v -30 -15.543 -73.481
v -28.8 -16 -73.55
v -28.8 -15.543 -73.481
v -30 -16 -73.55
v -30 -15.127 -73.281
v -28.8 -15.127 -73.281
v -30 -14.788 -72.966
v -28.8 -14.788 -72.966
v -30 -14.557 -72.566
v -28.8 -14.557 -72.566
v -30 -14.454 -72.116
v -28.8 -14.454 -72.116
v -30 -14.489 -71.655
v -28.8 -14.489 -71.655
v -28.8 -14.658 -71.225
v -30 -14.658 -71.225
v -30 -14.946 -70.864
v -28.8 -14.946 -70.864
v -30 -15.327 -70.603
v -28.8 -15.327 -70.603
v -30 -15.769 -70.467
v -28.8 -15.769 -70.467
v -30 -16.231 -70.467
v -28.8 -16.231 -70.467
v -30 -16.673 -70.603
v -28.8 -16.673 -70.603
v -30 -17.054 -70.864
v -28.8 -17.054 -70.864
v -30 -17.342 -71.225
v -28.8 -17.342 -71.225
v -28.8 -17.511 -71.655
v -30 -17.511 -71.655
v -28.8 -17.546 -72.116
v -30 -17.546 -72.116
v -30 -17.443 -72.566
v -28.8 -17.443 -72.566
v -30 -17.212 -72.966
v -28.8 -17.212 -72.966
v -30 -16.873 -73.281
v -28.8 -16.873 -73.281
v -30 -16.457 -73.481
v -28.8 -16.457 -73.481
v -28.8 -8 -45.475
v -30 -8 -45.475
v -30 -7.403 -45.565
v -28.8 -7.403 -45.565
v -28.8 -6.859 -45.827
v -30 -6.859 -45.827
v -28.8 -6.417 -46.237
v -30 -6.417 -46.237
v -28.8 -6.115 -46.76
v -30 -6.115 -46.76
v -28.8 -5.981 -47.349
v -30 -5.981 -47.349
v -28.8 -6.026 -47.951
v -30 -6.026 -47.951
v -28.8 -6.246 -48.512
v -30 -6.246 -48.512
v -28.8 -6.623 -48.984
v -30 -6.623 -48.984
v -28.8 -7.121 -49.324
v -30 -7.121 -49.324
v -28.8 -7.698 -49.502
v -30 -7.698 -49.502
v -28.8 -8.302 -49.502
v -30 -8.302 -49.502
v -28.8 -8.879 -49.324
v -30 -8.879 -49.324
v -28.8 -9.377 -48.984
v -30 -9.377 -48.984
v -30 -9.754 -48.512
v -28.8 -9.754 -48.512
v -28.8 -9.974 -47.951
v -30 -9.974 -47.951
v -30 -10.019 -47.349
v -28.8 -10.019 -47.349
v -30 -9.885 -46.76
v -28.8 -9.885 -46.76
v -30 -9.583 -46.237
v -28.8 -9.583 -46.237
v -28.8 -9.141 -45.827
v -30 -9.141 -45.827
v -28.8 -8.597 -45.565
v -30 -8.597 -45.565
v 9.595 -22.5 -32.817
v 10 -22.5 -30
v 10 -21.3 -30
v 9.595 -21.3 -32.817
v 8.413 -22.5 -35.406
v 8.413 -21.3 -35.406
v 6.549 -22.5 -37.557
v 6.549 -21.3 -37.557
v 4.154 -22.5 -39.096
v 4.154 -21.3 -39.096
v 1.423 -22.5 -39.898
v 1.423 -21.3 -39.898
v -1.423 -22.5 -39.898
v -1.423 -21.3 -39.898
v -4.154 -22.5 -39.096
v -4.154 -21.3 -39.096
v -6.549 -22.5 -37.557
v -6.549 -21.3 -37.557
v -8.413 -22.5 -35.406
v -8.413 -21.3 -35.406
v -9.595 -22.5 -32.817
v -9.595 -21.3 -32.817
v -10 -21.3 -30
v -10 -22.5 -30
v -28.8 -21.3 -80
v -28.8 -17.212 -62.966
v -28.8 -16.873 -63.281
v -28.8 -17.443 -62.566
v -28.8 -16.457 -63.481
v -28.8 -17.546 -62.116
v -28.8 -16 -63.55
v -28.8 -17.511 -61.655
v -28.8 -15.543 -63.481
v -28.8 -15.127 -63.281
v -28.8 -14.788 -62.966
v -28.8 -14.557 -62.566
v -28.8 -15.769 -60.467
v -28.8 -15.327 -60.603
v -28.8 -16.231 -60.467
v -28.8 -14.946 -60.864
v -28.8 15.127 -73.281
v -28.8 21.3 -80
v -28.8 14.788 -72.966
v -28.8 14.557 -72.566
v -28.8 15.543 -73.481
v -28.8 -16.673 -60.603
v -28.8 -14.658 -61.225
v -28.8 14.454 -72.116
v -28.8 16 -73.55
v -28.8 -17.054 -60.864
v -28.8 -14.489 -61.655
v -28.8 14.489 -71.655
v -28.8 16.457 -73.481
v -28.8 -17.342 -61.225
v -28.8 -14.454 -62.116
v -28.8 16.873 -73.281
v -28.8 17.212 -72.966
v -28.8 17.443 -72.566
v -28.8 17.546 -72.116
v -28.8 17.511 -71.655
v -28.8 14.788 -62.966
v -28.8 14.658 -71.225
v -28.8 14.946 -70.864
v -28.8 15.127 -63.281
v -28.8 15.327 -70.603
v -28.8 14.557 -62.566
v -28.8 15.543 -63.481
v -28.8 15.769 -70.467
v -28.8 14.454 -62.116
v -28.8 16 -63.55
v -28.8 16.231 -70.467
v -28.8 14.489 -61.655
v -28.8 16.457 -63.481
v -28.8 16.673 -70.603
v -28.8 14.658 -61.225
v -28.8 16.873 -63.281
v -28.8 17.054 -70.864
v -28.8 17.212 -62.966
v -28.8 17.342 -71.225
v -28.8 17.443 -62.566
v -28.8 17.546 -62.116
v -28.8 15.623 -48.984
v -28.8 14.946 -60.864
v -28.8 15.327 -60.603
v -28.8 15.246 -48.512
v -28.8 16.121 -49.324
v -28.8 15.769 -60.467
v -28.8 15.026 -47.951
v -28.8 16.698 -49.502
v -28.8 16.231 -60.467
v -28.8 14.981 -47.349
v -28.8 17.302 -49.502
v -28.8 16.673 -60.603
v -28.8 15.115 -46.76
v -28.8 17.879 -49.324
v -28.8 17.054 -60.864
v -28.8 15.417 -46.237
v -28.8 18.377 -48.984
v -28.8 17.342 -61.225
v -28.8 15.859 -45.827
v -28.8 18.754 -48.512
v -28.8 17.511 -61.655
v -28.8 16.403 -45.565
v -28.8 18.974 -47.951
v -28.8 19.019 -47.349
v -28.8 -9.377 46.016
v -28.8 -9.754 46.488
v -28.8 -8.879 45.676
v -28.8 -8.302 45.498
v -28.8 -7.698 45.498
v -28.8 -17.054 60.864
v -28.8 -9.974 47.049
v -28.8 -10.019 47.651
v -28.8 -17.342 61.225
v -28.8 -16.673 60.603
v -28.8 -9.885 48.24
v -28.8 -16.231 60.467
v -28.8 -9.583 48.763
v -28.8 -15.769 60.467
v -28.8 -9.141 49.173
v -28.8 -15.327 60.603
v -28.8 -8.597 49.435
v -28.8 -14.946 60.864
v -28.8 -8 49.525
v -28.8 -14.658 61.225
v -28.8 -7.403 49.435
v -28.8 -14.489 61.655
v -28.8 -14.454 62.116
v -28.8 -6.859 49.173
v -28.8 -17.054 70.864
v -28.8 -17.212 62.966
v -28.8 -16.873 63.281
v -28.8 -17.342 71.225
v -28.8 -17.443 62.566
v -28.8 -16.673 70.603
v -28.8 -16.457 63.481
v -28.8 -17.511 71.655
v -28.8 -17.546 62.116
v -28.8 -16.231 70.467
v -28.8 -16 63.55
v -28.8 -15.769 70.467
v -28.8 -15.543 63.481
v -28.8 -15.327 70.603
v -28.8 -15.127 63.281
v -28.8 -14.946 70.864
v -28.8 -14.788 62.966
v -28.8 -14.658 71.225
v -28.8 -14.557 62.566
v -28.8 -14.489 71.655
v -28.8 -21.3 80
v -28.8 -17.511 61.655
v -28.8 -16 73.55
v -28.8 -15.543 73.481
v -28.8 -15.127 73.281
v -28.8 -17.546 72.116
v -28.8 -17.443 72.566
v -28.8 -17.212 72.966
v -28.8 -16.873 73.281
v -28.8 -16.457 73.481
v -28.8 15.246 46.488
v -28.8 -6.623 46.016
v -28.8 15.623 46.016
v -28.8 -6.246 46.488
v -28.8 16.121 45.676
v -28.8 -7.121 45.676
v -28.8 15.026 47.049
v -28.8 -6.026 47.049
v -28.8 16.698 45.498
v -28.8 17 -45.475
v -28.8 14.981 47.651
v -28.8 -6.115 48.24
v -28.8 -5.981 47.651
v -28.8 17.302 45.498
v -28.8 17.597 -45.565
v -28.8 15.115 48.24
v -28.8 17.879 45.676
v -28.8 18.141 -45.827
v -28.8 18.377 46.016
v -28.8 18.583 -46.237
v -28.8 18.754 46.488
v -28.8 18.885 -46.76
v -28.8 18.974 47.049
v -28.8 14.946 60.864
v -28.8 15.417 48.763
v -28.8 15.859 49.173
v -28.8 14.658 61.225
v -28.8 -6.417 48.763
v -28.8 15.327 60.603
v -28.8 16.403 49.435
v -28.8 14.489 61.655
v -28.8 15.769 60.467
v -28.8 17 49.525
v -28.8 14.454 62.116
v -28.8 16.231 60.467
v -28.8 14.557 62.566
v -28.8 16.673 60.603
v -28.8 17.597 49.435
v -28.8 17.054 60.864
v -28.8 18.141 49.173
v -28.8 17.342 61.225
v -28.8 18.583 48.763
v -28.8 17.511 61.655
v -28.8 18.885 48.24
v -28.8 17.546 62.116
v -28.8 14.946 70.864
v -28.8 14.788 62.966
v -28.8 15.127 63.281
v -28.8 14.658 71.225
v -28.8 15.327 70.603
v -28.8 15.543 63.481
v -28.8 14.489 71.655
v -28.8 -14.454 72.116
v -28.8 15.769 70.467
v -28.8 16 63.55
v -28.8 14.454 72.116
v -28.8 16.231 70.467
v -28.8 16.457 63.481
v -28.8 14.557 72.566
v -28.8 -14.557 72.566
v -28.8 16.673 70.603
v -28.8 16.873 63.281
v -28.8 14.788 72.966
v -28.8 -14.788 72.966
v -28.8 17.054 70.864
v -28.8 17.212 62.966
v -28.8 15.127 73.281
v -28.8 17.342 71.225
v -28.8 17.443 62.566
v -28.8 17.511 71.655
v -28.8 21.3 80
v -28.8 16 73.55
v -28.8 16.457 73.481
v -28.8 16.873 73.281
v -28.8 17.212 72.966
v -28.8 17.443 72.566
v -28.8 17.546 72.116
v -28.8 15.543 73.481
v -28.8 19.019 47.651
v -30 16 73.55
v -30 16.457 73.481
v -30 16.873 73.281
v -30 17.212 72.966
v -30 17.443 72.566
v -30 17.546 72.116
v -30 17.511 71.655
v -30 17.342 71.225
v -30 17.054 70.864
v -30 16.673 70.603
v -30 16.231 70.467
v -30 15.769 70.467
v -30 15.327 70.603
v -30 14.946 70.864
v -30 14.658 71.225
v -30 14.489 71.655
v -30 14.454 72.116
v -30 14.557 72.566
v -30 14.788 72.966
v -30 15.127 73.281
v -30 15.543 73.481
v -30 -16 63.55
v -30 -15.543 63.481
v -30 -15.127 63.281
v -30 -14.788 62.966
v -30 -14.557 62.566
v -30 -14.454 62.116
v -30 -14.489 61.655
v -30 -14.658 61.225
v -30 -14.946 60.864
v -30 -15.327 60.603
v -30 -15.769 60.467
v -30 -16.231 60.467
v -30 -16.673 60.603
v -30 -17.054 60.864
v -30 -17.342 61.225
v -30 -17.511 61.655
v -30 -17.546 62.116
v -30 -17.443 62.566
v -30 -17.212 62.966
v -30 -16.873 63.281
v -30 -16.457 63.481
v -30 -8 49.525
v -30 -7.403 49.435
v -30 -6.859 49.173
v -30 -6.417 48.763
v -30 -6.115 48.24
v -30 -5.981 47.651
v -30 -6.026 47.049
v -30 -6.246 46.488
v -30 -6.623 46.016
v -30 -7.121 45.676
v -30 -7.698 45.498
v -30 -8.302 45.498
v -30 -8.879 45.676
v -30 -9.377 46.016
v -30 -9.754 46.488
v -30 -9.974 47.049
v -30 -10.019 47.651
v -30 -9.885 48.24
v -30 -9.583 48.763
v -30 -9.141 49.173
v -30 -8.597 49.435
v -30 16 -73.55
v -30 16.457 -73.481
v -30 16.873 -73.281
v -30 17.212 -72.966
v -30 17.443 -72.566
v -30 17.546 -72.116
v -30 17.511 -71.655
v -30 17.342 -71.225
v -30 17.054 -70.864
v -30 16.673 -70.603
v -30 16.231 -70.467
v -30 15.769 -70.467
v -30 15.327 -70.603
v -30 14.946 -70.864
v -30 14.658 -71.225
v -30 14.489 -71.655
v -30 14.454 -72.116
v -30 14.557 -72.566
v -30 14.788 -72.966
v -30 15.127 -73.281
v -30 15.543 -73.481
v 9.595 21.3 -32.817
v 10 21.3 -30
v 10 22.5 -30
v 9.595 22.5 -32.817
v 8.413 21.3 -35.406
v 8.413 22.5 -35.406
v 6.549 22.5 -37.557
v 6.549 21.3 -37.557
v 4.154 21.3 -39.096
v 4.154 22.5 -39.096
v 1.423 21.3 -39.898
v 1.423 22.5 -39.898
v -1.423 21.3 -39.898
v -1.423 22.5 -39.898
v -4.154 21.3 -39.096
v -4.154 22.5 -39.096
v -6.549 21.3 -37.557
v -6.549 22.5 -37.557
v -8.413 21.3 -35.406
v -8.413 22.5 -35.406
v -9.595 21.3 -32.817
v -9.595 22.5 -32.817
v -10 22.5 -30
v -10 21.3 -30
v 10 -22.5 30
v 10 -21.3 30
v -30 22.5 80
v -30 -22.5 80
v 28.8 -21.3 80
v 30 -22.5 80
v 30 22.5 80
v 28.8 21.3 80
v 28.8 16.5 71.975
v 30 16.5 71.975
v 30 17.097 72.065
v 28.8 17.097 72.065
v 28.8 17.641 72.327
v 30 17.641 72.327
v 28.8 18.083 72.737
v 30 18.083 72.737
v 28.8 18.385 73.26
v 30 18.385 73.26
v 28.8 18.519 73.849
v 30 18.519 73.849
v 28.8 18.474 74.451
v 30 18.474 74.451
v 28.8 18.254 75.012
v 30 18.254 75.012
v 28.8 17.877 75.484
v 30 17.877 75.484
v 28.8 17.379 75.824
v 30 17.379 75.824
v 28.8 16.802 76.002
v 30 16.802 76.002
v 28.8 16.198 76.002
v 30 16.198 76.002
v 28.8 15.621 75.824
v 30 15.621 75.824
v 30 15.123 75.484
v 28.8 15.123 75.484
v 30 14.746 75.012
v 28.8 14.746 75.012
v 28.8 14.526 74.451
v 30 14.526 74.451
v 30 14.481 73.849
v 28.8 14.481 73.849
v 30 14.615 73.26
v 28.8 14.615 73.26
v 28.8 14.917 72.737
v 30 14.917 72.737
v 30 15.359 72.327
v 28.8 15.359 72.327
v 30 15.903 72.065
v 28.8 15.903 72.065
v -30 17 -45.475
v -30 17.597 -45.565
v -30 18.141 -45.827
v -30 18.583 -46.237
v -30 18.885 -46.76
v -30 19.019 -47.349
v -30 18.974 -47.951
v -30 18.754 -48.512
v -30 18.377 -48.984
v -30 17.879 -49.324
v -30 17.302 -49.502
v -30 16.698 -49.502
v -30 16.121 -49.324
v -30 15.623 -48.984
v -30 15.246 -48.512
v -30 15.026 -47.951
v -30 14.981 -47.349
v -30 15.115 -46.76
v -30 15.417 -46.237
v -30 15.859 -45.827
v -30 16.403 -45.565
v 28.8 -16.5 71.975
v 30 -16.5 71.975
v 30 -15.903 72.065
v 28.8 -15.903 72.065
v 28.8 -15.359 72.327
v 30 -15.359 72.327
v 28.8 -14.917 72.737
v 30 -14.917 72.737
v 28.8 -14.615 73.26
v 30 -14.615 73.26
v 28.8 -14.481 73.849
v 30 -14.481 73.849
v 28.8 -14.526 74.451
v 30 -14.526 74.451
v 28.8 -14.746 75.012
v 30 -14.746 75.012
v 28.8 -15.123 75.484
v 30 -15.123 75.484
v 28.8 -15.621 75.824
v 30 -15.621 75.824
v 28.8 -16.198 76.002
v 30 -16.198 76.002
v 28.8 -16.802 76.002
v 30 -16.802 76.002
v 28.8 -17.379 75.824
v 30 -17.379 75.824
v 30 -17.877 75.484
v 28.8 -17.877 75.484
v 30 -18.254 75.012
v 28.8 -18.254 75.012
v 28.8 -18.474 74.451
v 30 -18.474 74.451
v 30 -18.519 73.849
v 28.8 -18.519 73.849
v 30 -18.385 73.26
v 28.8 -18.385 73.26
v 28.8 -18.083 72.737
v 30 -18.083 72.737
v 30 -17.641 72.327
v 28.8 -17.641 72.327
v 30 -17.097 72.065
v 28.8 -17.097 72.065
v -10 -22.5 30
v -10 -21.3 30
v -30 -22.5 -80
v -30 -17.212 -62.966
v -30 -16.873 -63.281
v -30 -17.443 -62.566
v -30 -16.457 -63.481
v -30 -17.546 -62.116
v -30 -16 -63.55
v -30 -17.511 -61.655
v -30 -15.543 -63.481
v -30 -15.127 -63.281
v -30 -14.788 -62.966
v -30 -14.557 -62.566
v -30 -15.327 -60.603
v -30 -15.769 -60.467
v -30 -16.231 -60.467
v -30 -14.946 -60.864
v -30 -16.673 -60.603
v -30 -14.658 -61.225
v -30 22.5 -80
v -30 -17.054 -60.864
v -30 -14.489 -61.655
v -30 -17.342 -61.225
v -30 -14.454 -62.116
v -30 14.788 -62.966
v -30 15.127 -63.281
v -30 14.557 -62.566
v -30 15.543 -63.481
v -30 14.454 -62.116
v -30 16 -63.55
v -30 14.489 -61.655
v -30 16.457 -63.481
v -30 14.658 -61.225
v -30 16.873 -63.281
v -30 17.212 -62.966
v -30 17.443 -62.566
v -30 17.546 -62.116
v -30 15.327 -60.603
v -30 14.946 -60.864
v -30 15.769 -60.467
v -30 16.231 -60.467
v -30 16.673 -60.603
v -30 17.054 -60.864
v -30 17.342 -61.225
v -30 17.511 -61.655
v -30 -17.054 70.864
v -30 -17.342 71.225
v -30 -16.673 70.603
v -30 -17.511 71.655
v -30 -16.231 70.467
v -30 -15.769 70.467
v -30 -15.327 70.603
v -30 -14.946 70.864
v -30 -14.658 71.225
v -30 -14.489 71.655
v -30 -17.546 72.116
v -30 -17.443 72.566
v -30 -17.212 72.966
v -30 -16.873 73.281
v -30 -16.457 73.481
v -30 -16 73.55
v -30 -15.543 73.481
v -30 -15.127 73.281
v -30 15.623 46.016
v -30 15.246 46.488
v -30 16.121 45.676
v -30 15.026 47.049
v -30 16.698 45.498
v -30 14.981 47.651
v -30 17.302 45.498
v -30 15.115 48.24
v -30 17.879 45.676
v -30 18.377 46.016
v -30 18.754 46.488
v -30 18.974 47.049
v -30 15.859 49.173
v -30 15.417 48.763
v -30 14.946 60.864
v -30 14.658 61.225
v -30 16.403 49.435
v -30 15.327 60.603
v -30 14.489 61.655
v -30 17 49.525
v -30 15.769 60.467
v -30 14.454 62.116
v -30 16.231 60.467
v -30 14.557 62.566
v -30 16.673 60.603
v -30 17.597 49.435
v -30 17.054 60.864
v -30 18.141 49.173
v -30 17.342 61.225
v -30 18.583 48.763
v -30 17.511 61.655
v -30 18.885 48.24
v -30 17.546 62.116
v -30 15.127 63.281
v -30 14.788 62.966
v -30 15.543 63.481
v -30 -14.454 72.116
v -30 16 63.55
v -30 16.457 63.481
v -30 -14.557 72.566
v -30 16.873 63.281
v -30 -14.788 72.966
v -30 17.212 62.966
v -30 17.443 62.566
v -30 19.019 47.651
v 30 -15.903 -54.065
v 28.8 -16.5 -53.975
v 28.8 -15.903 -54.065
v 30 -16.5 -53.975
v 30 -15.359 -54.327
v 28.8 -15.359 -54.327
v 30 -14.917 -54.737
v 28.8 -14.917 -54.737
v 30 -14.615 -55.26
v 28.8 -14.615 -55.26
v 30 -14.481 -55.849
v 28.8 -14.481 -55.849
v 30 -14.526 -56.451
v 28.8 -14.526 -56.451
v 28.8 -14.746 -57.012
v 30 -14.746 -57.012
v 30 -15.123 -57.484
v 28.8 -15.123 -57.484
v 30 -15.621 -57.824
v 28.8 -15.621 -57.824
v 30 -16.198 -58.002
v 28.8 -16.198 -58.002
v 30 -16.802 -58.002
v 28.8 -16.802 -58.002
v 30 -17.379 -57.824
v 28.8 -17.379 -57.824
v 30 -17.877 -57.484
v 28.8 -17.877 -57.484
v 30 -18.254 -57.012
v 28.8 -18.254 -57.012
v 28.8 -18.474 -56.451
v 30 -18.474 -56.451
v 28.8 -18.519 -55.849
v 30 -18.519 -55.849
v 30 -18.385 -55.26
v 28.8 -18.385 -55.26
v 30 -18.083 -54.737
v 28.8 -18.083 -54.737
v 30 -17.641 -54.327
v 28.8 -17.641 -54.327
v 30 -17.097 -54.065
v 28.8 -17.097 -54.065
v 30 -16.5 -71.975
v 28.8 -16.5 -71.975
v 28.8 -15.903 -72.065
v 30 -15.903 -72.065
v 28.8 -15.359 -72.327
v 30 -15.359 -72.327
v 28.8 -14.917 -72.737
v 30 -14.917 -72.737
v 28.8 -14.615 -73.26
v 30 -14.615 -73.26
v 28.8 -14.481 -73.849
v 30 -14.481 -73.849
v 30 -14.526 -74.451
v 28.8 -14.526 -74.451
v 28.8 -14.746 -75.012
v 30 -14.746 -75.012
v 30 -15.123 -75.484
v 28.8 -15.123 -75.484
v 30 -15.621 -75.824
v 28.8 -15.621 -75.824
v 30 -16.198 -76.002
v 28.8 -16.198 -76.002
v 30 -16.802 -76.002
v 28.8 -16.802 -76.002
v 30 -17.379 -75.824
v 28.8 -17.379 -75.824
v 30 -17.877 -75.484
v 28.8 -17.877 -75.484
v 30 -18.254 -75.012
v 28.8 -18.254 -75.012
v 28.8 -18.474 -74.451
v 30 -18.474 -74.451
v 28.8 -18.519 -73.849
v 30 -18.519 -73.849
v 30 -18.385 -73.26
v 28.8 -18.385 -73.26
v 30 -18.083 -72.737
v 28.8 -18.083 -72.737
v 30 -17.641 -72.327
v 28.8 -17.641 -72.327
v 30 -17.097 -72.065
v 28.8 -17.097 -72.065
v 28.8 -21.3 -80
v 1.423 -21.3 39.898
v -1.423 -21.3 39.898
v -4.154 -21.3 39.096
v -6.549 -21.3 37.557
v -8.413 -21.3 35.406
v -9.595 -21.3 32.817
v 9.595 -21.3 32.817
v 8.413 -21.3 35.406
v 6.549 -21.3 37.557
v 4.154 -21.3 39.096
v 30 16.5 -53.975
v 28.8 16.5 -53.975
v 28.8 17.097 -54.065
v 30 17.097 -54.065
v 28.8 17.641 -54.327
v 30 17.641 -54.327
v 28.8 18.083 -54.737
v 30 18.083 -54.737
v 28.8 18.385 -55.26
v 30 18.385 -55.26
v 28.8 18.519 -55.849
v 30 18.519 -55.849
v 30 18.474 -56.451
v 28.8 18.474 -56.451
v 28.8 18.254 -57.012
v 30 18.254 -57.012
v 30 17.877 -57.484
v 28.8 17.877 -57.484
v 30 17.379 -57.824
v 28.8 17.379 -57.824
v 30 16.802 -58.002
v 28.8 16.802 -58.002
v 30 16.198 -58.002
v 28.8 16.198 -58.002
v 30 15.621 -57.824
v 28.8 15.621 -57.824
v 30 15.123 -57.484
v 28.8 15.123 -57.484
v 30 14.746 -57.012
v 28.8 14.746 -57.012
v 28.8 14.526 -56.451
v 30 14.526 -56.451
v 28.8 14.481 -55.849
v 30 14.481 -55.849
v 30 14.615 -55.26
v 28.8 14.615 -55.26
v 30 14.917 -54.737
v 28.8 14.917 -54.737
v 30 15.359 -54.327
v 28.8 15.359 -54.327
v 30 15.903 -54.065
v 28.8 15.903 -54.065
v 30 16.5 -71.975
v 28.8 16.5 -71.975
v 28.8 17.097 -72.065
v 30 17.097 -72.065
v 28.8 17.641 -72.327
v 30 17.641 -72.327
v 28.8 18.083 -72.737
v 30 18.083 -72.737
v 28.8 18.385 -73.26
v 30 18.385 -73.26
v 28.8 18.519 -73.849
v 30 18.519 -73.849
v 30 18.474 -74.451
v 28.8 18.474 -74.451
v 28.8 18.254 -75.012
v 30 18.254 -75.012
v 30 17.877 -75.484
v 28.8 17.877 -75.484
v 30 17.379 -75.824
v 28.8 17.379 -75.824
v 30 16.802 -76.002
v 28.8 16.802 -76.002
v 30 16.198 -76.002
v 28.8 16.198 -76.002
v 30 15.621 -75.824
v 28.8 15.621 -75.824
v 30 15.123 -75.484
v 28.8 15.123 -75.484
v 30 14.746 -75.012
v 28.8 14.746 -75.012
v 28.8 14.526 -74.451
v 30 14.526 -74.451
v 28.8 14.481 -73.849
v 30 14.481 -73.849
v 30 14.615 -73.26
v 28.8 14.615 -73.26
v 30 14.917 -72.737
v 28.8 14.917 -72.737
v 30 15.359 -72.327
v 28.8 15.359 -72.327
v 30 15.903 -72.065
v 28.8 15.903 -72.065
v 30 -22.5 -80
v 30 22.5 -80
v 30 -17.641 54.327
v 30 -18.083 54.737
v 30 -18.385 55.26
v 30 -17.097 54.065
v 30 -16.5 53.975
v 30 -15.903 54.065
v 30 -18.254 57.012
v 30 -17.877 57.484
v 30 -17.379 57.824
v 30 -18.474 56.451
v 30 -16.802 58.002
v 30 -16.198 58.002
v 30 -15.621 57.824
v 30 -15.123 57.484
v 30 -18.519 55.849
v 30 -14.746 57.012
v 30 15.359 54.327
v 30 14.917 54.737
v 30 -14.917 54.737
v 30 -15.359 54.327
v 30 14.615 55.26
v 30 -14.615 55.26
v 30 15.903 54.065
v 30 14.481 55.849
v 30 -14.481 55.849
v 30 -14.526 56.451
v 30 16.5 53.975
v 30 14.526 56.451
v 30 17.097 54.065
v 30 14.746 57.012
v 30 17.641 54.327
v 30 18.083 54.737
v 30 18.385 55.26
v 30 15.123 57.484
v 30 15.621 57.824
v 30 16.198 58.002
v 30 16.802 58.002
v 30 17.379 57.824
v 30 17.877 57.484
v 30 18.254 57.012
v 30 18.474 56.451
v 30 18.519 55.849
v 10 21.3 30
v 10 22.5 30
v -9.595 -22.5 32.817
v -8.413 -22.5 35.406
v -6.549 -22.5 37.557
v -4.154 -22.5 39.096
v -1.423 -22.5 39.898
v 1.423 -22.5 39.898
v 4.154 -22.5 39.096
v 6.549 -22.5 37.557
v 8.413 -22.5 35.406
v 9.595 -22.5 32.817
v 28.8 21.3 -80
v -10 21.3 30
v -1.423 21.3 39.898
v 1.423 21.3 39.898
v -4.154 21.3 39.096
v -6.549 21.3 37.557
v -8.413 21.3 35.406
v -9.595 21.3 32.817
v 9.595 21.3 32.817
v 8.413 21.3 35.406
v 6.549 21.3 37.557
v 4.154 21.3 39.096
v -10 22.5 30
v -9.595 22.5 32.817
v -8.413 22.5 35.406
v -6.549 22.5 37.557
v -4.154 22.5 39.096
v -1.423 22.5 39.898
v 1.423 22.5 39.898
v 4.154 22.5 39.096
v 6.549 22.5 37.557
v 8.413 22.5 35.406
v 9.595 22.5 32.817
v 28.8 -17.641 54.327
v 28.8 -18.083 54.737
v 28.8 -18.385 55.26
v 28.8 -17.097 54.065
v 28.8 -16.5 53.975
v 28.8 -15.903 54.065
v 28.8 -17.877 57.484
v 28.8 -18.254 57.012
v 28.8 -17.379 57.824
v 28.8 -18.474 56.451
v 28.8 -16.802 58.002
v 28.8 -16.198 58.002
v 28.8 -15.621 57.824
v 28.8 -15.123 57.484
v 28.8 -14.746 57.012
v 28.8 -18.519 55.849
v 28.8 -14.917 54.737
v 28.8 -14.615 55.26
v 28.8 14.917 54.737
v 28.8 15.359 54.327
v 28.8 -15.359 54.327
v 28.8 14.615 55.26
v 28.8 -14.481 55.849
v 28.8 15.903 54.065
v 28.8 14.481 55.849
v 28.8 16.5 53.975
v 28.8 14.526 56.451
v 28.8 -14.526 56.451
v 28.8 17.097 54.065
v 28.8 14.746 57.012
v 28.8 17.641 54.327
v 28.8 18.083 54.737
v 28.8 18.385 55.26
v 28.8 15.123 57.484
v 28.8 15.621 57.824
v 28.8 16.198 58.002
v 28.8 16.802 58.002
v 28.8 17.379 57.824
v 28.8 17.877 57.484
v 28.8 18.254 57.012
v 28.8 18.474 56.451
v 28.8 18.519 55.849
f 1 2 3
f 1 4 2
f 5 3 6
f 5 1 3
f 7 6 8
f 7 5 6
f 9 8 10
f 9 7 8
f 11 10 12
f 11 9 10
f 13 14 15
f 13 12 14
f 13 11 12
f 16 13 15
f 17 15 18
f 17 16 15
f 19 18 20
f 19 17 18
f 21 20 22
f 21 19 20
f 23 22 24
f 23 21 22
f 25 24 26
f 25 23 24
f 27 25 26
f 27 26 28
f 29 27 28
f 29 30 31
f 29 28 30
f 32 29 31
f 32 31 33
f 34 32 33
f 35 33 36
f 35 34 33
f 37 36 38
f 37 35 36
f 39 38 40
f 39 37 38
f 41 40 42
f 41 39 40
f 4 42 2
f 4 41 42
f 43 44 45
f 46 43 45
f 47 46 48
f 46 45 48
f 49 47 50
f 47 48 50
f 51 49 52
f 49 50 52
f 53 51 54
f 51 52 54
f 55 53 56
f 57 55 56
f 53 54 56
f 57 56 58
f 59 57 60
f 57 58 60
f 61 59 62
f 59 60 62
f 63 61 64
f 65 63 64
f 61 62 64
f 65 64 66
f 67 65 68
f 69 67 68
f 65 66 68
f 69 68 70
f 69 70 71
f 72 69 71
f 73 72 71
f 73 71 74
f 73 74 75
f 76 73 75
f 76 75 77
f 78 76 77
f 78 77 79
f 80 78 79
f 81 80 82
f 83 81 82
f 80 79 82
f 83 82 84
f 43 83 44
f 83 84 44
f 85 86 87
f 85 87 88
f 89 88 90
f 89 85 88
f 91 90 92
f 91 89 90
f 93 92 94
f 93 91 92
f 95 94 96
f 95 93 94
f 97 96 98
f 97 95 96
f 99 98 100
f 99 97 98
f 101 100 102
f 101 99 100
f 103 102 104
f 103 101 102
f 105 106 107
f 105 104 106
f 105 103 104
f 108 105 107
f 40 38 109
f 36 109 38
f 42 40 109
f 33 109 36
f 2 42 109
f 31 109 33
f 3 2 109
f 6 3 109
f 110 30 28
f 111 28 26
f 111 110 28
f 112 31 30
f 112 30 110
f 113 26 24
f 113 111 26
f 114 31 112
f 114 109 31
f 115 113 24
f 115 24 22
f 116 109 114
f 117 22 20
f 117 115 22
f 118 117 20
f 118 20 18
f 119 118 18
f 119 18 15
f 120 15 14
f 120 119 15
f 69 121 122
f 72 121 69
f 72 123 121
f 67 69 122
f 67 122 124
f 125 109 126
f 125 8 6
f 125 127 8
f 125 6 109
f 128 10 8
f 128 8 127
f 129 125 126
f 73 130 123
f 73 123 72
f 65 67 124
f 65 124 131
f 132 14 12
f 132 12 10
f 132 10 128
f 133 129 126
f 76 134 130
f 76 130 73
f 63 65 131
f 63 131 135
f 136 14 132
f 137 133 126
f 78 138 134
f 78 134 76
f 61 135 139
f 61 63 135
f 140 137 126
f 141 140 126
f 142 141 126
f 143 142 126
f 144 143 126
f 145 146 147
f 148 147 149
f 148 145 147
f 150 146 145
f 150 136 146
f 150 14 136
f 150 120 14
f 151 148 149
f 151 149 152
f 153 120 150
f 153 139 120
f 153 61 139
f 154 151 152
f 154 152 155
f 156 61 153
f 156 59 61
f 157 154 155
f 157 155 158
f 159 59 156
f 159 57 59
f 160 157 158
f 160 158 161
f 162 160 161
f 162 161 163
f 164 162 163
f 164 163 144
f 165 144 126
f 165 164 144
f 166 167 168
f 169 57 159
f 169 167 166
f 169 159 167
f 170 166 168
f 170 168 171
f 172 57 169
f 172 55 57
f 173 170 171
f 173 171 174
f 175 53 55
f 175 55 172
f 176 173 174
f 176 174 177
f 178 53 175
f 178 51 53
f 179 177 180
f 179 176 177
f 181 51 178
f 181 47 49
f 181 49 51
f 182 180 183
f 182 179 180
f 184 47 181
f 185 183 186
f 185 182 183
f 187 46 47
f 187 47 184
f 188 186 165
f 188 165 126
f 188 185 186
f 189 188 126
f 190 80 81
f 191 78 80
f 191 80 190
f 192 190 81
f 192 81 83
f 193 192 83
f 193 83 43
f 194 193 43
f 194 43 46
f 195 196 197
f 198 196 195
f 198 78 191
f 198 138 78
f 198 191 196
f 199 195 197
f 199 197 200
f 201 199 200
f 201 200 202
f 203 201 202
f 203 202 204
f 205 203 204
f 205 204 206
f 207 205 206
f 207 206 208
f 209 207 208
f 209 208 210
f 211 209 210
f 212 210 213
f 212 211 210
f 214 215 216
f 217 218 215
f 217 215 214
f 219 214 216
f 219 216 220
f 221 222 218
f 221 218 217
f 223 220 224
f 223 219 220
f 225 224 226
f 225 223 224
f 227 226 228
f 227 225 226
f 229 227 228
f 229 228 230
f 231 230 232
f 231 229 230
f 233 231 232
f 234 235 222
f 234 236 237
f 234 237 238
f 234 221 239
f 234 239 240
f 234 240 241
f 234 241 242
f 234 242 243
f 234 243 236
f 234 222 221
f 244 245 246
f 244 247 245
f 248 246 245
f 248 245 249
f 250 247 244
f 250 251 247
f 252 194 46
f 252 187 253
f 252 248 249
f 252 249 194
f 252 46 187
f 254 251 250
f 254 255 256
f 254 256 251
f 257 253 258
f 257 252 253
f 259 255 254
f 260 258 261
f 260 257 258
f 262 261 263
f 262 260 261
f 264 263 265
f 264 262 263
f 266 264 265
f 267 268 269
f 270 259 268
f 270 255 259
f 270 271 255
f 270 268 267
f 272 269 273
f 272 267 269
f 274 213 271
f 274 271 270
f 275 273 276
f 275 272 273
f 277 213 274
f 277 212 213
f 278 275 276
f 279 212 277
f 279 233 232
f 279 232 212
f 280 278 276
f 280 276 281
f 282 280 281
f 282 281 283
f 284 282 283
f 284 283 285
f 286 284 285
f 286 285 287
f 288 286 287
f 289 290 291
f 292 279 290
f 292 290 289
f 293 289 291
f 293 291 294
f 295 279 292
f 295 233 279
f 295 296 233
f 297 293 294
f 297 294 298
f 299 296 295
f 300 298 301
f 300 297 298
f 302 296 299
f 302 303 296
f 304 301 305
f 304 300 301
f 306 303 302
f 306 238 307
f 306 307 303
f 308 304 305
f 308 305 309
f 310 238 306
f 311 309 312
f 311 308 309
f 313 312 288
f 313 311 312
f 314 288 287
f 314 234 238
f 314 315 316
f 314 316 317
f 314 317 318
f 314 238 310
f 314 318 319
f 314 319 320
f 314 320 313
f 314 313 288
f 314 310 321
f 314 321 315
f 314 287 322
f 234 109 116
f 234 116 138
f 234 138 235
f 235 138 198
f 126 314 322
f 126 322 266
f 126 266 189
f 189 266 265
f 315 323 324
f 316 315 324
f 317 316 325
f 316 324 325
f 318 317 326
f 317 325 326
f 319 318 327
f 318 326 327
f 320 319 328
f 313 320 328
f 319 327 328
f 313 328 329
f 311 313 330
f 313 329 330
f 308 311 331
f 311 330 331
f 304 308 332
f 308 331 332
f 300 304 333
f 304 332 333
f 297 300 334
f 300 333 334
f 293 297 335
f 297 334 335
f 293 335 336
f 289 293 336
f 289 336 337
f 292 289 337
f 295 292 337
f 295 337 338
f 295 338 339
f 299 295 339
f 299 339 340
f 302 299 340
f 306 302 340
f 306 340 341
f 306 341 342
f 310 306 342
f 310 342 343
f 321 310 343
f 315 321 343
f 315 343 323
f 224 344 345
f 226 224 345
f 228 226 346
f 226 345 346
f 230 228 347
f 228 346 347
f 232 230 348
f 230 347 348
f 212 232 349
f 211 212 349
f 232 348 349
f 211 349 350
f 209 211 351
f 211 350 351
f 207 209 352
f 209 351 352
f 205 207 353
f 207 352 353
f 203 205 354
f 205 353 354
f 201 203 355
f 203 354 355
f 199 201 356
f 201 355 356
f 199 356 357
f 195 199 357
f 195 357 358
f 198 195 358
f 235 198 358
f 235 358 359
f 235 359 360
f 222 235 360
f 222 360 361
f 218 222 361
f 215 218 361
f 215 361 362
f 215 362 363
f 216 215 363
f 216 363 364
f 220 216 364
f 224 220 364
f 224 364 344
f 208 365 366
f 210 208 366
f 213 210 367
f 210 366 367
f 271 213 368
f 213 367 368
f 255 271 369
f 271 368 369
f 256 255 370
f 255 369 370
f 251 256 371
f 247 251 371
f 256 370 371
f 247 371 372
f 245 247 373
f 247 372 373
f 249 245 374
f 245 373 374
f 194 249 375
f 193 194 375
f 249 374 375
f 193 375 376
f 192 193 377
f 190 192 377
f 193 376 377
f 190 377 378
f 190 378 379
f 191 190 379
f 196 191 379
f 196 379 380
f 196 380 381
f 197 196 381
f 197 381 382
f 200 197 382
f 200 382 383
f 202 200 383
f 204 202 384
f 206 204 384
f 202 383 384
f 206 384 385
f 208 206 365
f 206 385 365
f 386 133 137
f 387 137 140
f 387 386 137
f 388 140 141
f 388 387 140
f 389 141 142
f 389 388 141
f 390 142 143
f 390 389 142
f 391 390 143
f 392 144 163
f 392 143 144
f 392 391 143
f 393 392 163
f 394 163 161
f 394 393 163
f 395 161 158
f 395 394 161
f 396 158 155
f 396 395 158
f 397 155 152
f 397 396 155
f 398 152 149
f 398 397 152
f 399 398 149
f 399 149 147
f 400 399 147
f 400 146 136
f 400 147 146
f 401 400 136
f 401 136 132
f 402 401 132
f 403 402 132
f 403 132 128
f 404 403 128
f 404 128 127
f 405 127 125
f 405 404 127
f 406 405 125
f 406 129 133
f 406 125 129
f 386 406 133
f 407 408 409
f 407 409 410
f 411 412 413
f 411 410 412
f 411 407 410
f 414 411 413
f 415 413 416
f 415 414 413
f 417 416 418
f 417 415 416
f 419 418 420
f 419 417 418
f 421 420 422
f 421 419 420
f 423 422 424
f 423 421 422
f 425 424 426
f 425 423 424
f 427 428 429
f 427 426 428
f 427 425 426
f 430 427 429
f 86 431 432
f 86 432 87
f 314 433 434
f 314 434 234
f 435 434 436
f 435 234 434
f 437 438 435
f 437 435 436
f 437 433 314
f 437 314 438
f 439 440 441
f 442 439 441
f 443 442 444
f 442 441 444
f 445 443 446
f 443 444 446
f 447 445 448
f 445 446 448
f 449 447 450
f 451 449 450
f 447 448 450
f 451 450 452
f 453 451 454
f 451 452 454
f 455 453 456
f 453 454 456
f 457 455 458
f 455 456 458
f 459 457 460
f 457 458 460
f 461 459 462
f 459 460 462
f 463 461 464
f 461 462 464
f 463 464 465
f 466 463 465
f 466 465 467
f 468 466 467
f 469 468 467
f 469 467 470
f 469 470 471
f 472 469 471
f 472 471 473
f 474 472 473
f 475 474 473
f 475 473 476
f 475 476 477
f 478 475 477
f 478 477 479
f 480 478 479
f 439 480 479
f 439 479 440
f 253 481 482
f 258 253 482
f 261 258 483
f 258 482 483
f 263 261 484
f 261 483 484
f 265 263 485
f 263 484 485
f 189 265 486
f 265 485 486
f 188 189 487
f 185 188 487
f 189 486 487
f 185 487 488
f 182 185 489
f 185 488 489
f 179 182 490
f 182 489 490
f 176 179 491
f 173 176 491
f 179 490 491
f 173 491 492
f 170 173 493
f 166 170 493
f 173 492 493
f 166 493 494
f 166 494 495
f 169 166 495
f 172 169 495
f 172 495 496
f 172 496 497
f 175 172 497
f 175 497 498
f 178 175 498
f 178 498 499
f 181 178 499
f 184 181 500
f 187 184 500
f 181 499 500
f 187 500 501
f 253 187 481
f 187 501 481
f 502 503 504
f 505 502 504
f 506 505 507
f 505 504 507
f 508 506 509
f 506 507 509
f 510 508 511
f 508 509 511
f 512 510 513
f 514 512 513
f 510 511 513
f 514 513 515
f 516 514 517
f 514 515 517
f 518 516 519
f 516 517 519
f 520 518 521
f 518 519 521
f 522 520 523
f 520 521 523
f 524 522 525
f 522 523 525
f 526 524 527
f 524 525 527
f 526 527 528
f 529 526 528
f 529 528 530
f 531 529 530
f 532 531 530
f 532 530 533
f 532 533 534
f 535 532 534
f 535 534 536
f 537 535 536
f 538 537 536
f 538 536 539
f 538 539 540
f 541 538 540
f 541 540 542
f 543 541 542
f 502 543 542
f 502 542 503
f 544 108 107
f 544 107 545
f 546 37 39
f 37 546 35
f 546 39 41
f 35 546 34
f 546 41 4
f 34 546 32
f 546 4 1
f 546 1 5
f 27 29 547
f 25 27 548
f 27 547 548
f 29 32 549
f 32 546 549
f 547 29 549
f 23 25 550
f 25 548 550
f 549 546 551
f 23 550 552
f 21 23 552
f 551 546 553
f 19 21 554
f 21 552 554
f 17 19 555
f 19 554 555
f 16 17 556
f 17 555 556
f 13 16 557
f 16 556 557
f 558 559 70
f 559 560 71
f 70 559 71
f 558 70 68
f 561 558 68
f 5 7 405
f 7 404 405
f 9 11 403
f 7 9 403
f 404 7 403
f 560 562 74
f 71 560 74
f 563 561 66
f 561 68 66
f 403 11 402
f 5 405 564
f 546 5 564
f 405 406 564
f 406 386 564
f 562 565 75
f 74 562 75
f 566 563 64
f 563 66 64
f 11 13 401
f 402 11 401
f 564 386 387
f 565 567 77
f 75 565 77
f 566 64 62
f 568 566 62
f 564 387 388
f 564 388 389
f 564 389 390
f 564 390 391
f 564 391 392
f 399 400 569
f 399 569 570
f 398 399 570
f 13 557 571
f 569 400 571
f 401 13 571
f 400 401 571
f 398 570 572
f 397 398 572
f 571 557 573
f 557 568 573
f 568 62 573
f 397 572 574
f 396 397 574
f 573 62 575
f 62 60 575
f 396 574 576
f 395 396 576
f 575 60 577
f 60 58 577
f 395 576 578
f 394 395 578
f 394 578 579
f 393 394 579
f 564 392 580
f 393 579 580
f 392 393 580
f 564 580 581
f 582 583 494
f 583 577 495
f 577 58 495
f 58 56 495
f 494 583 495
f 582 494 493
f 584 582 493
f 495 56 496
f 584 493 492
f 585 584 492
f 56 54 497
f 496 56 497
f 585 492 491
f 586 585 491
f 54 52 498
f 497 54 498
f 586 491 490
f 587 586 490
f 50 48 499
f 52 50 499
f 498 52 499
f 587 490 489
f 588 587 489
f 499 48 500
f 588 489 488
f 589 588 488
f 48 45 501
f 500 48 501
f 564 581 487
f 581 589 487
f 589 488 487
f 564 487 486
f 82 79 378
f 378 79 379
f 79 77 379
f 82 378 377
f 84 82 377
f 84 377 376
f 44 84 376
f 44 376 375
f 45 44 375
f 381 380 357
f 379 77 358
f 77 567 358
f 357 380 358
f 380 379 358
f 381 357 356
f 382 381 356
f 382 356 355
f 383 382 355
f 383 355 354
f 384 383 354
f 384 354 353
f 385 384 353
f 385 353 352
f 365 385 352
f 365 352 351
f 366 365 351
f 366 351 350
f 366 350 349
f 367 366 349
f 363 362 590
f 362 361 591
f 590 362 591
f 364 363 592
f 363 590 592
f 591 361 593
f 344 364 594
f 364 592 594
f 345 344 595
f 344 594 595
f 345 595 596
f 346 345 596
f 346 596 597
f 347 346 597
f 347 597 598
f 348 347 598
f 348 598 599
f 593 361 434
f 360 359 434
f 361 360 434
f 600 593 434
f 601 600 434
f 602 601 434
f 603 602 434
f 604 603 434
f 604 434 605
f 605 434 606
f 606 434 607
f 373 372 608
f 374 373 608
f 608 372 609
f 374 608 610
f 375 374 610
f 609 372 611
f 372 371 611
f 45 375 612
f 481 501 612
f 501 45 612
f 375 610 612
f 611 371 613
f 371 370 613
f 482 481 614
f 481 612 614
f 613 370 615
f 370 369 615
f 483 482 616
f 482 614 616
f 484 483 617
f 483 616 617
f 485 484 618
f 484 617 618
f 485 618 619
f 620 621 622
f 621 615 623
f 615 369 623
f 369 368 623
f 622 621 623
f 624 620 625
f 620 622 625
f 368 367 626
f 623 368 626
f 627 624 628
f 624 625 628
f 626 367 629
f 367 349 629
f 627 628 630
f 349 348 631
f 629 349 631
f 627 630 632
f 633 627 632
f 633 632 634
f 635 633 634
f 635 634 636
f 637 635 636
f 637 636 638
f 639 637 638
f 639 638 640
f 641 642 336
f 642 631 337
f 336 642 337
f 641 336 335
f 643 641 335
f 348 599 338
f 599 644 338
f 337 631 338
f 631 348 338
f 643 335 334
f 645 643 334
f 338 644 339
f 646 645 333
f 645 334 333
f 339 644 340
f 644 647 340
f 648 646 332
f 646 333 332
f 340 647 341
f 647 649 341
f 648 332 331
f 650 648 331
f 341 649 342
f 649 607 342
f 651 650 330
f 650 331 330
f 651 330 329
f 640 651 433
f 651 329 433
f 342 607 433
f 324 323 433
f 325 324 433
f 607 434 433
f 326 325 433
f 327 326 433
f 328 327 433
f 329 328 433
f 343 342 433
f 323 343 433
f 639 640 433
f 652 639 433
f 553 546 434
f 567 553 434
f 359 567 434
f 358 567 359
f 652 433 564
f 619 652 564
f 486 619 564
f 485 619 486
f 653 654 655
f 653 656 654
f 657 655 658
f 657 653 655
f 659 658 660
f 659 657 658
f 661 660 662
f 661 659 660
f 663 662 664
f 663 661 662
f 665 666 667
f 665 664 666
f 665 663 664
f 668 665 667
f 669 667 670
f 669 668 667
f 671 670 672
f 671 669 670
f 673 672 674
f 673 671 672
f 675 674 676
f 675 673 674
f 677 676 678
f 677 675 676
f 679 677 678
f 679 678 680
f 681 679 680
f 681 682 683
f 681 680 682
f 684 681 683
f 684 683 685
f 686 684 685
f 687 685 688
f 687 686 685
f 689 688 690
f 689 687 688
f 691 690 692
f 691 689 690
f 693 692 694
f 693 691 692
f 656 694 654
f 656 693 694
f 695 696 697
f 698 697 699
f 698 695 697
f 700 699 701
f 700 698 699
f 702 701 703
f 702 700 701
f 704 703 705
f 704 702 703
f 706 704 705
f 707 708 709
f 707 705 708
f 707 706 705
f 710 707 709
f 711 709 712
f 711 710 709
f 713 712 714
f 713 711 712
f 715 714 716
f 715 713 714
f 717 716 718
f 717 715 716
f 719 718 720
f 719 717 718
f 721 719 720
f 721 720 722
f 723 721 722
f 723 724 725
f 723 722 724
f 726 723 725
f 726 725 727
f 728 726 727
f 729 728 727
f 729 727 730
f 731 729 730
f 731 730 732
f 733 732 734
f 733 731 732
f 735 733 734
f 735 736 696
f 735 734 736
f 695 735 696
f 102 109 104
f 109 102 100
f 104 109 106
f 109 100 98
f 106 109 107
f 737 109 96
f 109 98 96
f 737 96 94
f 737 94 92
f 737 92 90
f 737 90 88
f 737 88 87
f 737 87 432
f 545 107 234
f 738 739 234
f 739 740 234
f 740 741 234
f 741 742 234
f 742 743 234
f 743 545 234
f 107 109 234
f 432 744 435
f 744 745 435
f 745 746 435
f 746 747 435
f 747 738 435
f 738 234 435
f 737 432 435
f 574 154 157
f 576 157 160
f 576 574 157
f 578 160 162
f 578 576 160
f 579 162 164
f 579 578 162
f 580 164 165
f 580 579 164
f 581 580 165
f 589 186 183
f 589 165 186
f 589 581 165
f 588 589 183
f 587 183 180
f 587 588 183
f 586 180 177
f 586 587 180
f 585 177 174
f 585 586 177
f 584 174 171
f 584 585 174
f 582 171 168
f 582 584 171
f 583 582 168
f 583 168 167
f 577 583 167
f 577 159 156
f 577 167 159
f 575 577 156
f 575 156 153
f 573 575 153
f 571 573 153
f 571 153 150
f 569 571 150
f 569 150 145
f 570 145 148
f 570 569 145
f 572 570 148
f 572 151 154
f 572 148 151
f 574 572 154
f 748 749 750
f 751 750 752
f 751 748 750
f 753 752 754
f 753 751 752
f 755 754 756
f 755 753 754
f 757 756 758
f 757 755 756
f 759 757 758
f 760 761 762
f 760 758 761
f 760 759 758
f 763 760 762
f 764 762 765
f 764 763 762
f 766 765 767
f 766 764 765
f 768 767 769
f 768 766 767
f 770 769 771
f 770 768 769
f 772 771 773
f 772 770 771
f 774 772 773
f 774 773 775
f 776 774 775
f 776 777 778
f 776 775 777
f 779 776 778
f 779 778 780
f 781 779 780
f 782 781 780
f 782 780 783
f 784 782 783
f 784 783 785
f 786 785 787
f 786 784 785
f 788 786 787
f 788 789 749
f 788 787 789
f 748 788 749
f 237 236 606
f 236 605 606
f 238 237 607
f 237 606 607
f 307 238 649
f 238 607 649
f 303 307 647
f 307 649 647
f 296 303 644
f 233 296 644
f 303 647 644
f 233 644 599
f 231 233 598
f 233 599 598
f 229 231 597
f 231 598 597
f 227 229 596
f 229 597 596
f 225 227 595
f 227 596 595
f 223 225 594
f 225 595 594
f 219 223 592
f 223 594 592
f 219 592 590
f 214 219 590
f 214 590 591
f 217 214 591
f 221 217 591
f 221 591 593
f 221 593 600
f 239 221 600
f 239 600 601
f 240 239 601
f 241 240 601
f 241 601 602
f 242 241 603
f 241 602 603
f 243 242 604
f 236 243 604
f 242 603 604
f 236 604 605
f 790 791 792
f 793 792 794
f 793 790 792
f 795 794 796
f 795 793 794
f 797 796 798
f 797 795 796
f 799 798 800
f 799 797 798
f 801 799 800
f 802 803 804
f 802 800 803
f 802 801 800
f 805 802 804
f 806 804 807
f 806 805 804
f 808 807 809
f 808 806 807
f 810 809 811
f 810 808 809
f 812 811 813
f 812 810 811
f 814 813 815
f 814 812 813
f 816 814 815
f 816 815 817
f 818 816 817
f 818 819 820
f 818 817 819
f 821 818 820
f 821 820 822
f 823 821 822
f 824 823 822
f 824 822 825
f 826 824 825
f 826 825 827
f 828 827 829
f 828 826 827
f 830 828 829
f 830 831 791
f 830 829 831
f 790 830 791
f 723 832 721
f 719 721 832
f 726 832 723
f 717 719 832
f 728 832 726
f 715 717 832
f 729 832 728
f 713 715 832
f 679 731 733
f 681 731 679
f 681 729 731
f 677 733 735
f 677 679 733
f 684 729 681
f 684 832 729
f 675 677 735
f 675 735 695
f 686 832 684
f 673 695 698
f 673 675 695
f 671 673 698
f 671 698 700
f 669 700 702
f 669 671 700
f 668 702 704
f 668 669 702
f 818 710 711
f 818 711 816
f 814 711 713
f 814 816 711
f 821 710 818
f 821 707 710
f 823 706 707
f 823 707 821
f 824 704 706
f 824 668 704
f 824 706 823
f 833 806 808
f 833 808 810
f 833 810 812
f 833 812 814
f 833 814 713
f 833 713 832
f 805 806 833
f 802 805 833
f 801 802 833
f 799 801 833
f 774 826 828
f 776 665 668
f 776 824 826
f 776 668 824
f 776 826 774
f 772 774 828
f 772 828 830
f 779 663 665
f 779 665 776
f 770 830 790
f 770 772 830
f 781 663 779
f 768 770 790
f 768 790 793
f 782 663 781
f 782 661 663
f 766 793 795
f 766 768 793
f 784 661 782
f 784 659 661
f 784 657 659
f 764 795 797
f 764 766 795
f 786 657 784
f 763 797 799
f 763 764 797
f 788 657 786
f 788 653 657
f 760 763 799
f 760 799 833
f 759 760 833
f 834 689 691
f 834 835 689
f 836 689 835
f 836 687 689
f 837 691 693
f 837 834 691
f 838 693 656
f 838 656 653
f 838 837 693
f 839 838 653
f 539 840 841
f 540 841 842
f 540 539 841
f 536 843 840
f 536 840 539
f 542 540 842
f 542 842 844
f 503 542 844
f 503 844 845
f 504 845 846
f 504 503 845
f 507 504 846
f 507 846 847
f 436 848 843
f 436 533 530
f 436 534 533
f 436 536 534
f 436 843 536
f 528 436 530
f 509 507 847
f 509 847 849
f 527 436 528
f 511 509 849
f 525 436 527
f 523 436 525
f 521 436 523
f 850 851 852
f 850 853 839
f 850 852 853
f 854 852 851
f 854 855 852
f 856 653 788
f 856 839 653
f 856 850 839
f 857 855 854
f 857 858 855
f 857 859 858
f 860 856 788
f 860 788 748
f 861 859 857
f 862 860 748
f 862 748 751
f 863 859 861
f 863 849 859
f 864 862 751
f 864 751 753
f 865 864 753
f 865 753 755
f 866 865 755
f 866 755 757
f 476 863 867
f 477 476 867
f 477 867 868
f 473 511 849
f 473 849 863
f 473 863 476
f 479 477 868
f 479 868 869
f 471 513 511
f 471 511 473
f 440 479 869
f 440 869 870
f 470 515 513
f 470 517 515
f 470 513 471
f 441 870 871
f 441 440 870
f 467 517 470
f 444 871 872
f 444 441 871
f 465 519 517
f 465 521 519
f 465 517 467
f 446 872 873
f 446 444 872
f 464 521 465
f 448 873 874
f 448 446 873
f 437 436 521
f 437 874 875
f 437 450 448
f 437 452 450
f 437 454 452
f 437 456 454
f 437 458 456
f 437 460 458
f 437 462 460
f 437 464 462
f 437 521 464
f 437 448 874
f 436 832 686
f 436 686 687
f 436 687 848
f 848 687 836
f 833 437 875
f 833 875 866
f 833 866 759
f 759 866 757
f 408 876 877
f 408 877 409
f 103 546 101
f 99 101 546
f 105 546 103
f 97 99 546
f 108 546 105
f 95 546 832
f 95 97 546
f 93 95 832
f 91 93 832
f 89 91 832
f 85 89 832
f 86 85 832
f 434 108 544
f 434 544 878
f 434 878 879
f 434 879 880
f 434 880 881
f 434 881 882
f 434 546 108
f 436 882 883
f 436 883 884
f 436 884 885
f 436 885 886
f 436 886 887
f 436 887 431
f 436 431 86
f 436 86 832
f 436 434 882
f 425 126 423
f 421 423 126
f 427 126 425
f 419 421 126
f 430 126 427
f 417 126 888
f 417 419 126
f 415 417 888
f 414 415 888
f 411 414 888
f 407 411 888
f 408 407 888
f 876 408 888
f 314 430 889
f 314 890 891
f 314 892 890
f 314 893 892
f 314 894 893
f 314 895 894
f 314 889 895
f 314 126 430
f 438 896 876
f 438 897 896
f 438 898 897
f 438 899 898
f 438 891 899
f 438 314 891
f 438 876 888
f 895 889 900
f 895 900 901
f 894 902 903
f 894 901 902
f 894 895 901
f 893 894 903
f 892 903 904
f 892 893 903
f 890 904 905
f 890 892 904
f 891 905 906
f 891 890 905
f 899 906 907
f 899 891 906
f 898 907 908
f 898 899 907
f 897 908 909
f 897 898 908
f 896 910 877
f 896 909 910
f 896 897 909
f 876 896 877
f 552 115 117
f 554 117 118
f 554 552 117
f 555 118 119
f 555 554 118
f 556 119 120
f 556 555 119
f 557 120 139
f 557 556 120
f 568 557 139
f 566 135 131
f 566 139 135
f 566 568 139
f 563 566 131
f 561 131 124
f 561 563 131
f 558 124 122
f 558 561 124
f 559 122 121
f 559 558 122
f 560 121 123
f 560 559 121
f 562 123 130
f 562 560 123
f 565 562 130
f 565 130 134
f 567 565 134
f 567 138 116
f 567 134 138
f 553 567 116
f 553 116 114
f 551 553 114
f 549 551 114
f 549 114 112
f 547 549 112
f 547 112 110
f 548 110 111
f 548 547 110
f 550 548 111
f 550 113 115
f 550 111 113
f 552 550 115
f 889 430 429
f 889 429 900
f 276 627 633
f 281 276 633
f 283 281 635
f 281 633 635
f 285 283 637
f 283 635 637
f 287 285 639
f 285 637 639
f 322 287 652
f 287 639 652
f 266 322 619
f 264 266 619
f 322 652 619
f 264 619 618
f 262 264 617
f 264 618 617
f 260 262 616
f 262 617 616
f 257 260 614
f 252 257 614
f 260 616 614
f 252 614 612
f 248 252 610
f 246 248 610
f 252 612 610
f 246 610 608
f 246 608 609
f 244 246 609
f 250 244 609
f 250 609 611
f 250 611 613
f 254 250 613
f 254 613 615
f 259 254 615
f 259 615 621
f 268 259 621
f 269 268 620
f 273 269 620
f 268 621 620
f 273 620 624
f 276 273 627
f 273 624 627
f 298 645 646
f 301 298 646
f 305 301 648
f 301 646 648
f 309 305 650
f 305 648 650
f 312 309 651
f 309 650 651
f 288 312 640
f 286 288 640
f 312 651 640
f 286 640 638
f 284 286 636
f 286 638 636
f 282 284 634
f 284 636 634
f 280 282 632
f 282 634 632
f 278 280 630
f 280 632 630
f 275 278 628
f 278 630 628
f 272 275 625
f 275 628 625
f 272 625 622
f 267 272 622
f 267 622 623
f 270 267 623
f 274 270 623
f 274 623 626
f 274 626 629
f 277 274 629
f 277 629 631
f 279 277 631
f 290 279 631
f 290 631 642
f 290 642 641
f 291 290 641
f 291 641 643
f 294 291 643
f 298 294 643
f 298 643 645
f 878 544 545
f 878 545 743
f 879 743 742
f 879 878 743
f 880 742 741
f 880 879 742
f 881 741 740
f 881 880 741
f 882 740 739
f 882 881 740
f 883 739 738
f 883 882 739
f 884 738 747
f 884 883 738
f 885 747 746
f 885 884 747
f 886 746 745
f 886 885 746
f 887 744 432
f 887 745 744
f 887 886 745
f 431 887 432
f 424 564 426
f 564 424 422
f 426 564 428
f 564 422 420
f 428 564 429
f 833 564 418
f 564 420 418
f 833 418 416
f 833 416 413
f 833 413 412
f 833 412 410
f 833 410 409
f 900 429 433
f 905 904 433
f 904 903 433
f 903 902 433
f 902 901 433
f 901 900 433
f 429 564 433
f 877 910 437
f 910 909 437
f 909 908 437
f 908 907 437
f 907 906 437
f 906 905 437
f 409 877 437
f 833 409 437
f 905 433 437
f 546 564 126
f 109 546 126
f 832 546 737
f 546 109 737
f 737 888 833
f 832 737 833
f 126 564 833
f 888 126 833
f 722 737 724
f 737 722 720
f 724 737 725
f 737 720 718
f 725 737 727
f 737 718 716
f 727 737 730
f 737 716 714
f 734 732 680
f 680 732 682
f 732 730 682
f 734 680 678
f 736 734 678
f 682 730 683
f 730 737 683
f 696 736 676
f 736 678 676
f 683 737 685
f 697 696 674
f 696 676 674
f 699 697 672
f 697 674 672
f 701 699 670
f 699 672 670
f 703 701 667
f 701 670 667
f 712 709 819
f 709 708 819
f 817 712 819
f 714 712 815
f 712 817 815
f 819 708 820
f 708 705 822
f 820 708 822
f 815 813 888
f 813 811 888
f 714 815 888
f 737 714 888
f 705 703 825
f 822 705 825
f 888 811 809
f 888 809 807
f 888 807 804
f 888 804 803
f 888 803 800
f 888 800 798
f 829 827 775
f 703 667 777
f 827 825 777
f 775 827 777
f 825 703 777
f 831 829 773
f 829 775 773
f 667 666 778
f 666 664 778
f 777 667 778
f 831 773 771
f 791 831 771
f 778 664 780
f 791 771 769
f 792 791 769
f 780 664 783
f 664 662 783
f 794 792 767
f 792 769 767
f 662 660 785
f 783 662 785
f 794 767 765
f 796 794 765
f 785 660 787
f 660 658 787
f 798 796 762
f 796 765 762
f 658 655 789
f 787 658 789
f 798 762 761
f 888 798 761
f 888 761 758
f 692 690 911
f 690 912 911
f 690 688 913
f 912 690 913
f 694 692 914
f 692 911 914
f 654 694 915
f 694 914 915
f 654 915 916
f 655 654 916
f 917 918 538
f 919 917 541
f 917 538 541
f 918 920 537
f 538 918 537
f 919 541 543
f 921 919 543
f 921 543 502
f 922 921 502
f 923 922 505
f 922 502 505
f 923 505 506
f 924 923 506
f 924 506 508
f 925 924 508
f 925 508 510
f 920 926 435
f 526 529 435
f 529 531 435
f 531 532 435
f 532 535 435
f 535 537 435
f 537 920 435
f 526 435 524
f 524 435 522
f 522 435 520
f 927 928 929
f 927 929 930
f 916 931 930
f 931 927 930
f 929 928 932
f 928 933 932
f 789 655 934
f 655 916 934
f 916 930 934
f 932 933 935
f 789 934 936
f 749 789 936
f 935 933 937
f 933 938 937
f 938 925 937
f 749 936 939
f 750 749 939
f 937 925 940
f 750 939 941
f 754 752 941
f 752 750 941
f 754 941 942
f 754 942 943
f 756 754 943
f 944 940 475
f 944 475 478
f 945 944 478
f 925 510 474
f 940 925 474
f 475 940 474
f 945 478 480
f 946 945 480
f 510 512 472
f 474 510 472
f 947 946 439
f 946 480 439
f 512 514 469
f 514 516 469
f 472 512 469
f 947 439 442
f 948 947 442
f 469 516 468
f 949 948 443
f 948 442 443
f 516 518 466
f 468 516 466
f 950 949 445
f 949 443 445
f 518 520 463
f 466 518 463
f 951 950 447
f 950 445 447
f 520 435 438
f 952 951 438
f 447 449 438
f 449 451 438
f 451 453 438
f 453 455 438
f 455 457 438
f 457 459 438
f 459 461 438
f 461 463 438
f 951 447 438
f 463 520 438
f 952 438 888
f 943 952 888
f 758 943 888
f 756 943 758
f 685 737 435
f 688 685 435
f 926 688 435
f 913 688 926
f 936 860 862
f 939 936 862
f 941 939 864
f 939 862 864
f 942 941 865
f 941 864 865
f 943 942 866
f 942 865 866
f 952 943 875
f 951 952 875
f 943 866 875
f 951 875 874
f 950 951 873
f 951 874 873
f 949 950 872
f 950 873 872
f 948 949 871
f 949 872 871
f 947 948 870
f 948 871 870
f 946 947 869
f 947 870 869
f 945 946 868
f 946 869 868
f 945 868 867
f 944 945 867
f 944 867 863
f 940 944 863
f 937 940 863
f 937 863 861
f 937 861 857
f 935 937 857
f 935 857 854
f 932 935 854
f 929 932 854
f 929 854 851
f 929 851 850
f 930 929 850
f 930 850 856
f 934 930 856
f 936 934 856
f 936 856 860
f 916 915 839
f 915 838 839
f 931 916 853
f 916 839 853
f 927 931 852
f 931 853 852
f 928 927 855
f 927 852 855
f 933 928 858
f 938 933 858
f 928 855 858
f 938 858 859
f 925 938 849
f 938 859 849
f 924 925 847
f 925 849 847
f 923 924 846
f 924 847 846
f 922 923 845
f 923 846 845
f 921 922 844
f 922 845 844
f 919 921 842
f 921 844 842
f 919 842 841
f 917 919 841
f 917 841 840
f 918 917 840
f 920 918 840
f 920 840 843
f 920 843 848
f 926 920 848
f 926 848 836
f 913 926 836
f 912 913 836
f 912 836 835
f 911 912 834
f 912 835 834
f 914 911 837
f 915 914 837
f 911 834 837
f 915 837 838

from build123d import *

# Parameters (mm, degrees)
SKETCH_1_W          = 60
SKETCH_1_H          = 45
SKETCH_1_W_2        = 57.6
SKETCH_1_H_2        = 42.6
EXTRUDE_1_DEPTH     = 80
SKETCH_4_R          = 2.025
CUT_EXTRUDE_1_DEPTH = 5
SKETCH_5_R          = 1.55
CUT_EXTRUDE_2_DEPTH = 5
SKETCH_6_R          = 2.025
CUT_EXTRUDE_3_DEPTH = 1.2
CUT_EXTRUDE_4_DEPTH = 160


with BuildPart() as part:
    # 草图1 → 凸台-拉伸1 (new body, symmetric)
    with BuildSketch(Plane.XY):
        Rectangle(SKETCH_1_W, SKETCH_1_H)
        Rectangle(SKETCH_1_W_2, SKETCH_1_H_2, mode=Mode.SUBTRACT)
    extrude(amount=EXTRUDE_1_DEPTH, both=True)

    # 草图4 → 切除-拉伸1 (cut, symmetric)
    with BuildSketch(Plane(origin=(30, 0, 0), x_dir=(0, 0, -1), z_dir=(1, 0, 0))):
        with Locations((-74, 16.5)):
            Circle(SKETCH_4_R)
        with Locations((-56, 16.5)):
            Circle(SKETCH_4_R)
        with Locations((-74, -16.5)):
            Circle(SKETCH_4_R)
        with Locations((-56, -16.5)):
            Circle(SKETCH_4_R)
    cut_extrude_1 = extrude(amount=CUT_EXTRUDE_1_DEPTH, both=True, mode=Mode.SUBTRACT)

    # 镜向1: 切除-拉伸1 across plane
    add(cut_extrude_1.mirror(Plane.XY), mode=Mode.SUBTRACT)

    # 草图5 → 切除-拉伸2 (cut, symmetric)
    with BuildSketch(Plane.ZY.offset(30)):
        with Locations((62, 16)):
            Circle(SKETCH_5_R)
        with Locations((72, 16)):
            Circle(SKETCH_5_R)
        with Locations((62, -16)):
            Circle(SKETCH_5_R)
        with Locations((72, -16)):
            Circle(SKETCH_5_R)
    cut_extrude_2 = extrude(amount=CUT_EXTRUDE_2_DEPTH, both=True, mode=Mode.SUBTRACT)

    # 镜向2: 切除-拉伸2 across plane
    add(cut_extrude_2.mirror(Plane.XY), mode=Mode.SUBTRACT)

    # 草图6 → 切除-拉伸3 (cut)
    with BuildSketch(Plane.ZY.offset(30)):
        with Locations((47.5, -8)):
            Circle(SKETCH_6_R)
        with Locations((47.5, 17)):
            Circle(SKETCH_6_R)
        with Locations((-47.5, 17)):
            Circle(SKETCH_6_R)
        with Locations((-47.5, -8)):
            Circle(SKETCH_6_R)
    extrude(amount=-CUT_EXTRUDE_3_DEPTH, mode=Mode.SUBTRACT)

    # 草图7 → 切除-拉伸4 (cut)
    with BuildSketch(Plane.XZ.offset(22.5)):
        with BuildLine():
            Line((-10, -30), (-10, 30))
            ThreePointArc((-10, 30), (0, 40), (10, 30))
            Line((10, 30), (10, -30))
            ThreePointArc((10, -30), (0, -40), (-10, -30))
        make_face()
    extrude(amount=-CUT_EXTRUDE_4_DEPTH, mode=Mode.SUBTRACT)


solid = part.part
